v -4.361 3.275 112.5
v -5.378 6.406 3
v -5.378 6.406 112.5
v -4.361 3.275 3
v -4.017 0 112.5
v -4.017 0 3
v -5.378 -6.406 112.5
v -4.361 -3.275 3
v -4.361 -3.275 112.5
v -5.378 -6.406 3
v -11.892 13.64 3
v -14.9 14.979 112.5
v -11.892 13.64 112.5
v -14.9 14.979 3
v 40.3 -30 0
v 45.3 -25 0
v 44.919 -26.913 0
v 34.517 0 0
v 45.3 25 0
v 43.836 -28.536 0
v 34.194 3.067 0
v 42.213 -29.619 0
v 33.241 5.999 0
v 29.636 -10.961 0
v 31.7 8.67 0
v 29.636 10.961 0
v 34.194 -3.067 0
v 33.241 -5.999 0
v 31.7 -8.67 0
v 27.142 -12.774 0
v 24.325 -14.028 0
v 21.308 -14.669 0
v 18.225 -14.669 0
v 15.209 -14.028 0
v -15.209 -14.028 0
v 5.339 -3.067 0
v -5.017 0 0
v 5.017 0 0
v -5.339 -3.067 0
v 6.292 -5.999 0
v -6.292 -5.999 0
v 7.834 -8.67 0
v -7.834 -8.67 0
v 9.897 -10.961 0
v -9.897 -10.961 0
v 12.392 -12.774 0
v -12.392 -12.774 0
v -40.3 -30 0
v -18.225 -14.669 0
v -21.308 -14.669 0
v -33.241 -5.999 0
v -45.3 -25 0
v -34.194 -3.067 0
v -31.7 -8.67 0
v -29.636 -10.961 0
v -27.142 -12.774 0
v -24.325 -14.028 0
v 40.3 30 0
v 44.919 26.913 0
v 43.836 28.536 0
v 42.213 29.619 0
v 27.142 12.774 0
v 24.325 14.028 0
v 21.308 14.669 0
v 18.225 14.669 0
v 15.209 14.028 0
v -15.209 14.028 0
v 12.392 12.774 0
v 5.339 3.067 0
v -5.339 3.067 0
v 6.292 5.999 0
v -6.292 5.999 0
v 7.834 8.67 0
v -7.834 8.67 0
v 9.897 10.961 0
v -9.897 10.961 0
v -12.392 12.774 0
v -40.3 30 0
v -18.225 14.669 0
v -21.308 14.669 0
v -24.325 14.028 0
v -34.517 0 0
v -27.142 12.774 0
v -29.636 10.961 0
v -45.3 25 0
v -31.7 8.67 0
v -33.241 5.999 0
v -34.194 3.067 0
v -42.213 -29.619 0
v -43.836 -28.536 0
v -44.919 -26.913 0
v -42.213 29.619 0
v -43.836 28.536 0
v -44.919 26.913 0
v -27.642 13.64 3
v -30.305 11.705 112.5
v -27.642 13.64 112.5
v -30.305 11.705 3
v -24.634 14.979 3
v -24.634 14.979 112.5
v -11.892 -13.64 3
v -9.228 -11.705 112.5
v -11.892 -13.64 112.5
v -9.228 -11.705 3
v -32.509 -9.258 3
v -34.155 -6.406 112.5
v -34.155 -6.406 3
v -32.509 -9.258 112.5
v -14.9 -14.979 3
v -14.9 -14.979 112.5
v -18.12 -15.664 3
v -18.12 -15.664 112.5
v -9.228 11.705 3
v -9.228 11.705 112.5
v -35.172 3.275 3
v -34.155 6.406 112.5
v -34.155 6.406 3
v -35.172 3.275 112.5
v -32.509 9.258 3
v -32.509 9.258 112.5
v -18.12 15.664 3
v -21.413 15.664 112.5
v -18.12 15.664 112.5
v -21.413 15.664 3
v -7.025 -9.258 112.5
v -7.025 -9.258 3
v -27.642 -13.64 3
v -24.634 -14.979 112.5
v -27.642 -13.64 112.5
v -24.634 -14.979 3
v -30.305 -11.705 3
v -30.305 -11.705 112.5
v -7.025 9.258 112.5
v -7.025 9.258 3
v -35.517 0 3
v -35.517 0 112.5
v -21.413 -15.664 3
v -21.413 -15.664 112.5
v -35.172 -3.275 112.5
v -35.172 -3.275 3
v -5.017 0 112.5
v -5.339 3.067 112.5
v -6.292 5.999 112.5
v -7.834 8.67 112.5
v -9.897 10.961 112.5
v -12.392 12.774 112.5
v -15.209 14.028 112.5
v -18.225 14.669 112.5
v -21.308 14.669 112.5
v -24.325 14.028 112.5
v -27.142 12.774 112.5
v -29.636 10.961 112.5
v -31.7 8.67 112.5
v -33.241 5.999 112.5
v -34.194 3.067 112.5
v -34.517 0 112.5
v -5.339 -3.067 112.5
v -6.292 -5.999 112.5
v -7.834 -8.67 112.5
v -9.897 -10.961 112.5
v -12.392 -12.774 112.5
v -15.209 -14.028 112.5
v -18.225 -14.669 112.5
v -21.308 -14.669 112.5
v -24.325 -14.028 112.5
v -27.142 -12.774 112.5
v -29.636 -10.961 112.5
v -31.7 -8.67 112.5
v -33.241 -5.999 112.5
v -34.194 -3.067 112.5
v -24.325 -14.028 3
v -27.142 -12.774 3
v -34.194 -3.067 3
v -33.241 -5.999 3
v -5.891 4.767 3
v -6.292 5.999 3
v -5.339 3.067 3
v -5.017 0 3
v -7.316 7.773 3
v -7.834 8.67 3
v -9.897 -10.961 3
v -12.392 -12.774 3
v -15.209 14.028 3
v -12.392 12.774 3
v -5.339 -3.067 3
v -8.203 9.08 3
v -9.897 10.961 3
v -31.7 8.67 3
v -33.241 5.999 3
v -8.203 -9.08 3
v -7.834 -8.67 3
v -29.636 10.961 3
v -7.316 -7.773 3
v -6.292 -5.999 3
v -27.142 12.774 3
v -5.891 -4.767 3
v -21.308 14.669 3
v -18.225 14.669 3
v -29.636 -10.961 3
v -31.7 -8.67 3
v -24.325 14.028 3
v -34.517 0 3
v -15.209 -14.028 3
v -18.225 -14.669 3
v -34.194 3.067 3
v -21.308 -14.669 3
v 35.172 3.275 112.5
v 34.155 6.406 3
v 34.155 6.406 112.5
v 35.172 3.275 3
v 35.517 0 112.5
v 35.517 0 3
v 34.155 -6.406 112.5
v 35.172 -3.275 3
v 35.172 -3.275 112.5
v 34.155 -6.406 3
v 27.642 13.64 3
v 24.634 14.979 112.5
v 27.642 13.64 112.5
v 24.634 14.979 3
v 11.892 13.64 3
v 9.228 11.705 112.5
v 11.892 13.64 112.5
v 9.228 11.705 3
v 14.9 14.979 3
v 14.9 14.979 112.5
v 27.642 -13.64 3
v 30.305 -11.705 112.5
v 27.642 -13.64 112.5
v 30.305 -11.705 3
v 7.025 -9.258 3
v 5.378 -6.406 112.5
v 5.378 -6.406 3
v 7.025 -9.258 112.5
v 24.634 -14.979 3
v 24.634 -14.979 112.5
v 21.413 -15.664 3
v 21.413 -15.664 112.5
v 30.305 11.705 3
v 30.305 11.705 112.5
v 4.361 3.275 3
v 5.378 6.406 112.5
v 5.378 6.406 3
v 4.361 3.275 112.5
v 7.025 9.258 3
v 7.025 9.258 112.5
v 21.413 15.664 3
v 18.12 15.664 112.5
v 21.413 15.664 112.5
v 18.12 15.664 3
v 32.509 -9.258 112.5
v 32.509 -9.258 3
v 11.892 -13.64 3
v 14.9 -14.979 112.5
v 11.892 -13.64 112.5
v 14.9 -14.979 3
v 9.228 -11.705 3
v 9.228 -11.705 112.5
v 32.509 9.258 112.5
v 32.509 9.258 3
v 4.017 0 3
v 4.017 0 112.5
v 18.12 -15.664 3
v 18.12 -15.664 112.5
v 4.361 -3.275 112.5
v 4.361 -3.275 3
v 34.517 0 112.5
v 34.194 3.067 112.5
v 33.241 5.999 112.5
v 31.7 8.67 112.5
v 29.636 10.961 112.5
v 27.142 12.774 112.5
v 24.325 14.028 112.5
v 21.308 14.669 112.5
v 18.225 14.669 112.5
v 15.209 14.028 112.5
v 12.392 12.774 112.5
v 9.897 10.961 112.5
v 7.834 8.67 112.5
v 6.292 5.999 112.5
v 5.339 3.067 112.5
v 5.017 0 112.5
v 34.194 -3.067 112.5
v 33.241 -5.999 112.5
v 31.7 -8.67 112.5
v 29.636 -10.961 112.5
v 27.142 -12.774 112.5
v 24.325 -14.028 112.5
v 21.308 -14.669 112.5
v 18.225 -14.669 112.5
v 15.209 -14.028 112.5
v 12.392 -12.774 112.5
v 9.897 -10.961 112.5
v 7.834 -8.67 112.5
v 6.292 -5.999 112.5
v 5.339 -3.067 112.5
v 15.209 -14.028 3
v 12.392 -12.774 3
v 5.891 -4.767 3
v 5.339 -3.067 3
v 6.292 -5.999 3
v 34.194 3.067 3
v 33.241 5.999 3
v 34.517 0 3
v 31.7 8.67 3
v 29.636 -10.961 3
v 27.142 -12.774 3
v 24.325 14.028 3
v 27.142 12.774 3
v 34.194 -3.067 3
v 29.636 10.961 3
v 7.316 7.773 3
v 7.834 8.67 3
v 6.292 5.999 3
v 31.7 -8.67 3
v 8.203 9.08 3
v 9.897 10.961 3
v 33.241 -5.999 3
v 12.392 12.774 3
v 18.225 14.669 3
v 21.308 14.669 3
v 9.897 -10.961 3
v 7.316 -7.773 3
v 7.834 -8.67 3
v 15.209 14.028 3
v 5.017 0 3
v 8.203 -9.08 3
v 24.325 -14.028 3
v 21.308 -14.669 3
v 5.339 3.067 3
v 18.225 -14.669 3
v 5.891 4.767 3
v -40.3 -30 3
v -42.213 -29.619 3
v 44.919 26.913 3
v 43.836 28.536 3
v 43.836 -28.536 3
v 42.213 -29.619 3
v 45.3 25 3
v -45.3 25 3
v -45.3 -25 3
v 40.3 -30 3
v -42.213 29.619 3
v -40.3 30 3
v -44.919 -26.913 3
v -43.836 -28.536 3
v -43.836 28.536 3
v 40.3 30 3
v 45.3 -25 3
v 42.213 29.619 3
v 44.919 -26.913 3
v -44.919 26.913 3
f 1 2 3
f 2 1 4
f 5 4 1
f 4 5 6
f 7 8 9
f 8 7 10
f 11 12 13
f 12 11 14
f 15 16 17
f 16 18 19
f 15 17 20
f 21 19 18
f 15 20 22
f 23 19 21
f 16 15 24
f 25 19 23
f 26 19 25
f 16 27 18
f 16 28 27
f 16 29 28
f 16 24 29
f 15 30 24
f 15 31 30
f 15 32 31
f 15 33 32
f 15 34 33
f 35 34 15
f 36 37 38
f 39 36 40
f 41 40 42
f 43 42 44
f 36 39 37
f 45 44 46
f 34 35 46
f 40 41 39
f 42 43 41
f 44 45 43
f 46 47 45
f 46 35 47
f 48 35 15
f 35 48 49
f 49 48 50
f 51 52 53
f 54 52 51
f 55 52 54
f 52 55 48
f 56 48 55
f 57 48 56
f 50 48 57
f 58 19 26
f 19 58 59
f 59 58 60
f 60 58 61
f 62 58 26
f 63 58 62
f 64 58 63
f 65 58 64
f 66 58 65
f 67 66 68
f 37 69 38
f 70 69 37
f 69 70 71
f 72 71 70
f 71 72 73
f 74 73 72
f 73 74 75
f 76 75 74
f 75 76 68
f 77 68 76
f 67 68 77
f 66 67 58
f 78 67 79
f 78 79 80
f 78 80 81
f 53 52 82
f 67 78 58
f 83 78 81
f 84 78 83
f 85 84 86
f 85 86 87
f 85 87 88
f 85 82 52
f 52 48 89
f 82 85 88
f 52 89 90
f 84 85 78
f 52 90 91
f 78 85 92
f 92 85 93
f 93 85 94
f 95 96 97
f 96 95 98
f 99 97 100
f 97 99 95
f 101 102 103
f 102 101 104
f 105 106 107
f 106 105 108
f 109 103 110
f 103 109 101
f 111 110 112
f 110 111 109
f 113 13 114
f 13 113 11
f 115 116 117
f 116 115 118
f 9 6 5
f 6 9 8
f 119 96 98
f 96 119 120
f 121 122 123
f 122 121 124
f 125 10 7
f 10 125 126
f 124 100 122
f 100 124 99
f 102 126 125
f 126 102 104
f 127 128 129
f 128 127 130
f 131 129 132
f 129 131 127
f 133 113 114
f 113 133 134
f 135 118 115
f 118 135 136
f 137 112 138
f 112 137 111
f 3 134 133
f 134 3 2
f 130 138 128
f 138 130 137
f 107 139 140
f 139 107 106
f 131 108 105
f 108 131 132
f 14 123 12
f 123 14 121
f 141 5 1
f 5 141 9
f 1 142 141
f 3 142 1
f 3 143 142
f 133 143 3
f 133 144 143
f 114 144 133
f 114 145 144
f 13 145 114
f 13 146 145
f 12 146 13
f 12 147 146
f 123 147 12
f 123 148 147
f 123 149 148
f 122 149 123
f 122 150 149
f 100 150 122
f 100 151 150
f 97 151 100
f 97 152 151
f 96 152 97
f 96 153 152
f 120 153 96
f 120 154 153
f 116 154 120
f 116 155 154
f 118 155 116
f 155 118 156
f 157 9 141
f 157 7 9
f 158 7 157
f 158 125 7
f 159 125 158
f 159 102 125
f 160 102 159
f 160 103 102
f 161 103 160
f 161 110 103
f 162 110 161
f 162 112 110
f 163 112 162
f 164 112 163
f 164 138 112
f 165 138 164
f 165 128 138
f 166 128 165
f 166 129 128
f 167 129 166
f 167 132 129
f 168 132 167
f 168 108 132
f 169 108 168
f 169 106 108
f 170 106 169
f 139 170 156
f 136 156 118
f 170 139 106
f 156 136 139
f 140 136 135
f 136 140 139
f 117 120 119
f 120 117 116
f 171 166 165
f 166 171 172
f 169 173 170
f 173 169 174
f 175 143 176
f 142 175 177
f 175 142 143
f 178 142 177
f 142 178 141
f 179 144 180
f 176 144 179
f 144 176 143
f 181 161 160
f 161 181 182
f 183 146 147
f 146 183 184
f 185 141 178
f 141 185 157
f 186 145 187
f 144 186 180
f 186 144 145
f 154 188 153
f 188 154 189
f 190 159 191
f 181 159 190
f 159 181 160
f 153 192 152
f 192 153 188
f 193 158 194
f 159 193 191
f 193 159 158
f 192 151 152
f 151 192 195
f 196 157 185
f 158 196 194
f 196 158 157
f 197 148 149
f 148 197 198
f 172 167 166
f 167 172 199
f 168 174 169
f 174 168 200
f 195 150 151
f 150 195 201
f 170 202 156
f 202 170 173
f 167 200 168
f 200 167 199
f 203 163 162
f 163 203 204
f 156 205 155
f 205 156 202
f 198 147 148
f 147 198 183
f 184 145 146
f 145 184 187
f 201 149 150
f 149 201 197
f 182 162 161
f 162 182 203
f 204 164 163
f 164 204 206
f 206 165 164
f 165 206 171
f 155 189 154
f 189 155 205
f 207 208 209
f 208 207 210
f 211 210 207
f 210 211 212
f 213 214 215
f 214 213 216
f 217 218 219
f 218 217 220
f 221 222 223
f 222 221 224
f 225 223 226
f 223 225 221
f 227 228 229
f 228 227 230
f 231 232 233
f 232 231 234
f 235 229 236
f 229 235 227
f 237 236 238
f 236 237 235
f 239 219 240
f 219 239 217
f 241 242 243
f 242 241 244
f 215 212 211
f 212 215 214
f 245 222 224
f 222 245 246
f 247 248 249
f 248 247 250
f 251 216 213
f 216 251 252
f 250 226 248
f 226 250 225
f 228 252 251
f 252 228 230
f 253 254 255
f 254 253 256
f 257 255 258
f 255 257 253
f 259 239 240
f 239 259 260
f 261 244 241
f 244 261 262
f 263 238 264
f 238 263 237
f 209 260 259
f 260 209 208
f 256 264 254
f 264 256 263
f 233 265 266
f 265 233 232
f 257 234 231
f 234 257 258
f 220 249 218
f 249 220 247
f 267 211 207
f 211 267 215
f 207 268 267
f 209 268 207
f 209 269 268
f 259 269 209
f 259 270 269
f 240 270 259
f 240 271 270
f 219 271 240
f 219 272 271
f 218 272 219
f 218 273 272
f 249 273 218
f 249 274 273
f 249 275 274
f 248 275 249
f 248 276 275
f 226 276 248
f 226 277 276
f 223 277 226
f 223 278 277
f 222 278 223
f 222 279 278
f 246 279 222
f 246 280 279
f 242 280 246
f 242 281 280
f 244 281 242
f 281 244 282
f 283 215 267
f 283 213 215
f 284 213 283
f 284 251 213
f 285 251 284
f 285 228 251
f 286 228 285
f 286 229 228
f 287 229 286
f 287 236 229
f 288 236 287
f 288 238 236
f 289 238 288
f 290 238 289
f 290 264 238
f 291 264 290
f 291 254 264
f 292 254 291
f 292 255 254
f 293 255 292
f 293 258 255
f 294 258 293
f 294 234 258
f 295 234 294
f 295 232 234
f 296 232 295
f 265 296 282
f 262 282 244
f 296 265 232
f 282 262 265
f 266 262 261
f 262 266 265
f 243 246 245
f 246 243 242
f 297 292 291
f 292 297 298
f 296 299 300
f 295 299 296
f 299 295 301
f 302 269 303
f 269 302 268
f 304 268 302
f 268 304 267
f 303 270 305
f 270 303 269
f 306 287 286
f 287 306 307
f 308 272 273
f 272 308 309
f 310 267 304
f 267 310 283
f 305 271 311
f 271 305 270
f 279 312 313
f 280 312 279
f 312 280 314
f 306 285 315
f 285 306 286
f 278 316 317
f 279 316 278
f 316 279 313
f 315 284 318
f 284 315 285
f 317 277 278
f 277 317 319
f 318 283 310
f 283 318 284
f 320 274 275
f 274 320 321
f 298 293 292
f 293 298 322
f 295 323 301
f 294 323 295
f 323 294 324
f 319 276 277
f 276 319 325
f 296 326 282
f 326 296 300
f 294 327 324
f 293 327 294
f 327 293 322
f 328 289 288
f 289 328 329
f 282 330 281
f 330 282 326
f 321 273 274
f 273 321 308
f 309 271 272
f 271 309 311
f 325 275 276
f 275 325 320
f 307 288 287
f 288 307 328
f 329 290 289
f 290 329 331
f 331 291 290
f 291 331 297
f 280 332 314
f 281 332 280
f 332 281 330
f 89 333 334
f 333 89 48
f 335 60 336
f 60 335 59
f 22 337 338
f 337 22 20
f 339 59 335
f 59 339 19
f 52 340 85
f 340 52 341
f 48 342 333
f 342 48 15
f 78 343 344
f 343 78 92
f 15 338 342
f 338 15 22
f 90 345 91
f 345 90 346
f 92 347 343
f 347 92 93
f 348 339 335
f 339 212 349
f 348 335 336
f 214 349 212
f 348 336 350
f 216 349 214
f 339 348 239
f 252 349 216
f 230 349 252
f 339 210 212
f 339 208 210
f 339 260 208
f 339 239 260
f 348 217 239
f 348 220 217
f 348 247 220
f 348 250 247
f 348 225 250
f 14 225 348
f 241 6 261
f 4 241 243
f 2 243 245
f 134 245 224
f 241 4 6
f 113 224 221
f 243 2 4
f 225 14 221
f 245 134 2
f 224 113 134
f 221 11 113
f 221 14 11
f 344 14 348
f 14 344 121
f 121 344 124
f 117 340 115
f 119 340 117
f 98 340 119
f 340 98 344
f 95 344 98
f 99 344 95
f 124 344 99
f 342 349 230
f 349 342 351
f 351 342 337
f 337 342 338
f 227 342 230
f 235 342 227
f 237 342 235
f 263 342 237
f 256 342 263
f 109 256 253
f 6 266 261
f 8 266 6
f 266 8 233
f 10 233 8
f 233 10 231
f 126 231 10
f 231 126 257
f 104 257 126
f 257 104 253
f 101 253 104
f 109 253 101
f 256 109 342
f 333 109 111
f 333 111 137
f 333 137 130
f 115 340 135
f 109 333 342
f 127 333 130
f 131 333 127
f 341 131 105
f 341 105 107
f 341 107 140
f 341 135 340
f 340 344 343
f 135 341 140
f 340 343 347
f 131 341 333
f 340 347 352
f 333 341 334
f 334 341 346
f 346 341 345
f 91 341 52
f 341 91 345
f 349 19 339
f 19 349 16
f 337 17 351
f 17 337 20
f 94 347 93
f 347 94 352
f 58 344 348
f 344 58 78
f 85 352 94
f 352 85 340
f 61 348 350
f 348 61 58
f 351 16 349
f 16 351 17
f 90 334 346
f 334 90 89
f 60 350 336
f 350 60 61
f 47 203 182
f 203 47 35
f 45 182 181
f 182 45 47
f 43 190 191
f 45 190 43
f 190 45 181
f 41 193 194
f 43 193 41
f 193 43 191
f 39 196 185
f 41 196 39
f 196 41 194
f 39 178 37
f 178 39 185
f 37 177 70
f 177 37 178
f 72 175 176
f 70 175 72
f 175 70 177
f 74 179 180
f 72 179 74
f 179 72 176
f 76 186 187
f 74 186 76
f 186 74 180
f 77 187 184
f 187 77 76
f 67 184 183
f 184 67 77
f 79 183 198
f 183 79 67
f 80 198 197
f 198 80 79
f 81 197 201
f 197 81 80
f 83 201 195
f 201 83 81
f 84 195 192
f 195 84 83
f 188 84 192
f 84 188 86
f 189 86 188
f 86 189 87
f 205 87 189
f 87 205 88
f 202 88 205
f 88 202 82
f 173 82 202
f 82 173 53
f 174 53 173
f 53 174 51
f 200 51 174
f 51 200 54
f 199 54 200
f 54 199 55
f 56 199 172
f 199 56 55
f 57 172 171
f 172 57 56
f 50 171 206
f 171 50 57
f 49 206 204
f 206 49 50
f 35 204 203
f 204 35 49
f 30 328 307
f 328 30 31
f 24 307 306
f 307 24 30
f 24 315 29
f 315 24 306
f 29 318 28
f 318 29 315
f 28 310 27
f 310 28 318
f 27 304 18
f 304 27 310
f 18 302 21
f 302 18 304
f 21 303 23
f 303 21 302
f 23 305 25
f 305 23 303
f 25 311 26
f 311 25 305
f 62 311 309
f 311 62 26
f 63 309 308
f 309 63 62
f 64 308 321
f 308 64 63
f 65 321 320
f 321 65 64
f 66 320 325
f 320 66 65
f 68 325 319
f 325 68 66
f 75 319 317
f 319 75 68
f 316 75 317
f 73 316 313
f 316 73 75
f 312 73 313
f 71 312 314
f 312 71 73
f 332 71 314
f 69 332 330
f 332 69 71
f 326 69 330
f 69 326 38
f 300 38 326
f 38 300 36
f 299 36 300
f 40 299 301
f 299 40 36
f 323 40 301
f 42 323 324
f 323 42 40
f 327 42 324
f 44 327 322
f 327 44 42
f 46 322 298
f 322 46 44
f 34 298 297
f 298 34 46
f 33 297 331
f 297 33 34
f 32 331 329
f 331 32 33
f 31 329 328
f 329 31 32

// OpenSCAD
// panel for running kool through the wall
// this one is longer than morapanel.scad, and has slightly
// wider tubes so that the other panel can lock in (kool is
// 28.5, not 28). overall width and height remain the same,
// and the tubes are centered at the same points.

wall = 150;  // thickness of transfixed wall
//zmt = 19.05; // three-fourths of an inch diameter
kool = 28.5;  // max diameter of Koolance QD4 is 28mm
x = 33.6; // amount of free space in width
w = 2 * kool + x;
// (w+h) / w = w/h
// hh = ww - wh
// hh = 8208.36 - 90.6h
// h = 55.99
h = 60;

// placement of right hole. i fucked this up on the other
// panel, so we have a fudge factor, ugh.
centx = (34.6 / 6) + (28 / 2);

module rounded(width, height, radius_corner){
	translate([radius_corner, radius_corner, 0])
		minkowski() {
			square([width - 2 * radius_corner, height - 2 * radius_corner]);
			circle(radius_corner);
		}
}

// combined thickness of walls around tubes
cthick = 2;
// combined gap room of walls around tubes
cgap = 1;

module tube(){
	difference(){
		cylinder(3 * wall / 4, (kool + cthick + cgap) / 2, (kool + cthick + cgap) / 2);
		cylinder(3 * wall / 4, (kool + cgap) / 2, (kool + cgap) / 2);
	}
}

difference(){
	union(){
		linear_extrude(3){
			translate([-w / 2, -h / 2, 0]){
				rounded(w, h, 5);
			}
		}
		translate([-centx, 0, 0]){
			tube();
		}
		translate([centx, 0, 0]){
			tube();
		}
	}
	linear_extrude(3){
		translate([-centx, 0, 0]){
			circle((kool + cgap) / 2);
		}
		translate([centx, 0, 0]){
			circle((kool + cgap) / 2);
		}
	}
}
